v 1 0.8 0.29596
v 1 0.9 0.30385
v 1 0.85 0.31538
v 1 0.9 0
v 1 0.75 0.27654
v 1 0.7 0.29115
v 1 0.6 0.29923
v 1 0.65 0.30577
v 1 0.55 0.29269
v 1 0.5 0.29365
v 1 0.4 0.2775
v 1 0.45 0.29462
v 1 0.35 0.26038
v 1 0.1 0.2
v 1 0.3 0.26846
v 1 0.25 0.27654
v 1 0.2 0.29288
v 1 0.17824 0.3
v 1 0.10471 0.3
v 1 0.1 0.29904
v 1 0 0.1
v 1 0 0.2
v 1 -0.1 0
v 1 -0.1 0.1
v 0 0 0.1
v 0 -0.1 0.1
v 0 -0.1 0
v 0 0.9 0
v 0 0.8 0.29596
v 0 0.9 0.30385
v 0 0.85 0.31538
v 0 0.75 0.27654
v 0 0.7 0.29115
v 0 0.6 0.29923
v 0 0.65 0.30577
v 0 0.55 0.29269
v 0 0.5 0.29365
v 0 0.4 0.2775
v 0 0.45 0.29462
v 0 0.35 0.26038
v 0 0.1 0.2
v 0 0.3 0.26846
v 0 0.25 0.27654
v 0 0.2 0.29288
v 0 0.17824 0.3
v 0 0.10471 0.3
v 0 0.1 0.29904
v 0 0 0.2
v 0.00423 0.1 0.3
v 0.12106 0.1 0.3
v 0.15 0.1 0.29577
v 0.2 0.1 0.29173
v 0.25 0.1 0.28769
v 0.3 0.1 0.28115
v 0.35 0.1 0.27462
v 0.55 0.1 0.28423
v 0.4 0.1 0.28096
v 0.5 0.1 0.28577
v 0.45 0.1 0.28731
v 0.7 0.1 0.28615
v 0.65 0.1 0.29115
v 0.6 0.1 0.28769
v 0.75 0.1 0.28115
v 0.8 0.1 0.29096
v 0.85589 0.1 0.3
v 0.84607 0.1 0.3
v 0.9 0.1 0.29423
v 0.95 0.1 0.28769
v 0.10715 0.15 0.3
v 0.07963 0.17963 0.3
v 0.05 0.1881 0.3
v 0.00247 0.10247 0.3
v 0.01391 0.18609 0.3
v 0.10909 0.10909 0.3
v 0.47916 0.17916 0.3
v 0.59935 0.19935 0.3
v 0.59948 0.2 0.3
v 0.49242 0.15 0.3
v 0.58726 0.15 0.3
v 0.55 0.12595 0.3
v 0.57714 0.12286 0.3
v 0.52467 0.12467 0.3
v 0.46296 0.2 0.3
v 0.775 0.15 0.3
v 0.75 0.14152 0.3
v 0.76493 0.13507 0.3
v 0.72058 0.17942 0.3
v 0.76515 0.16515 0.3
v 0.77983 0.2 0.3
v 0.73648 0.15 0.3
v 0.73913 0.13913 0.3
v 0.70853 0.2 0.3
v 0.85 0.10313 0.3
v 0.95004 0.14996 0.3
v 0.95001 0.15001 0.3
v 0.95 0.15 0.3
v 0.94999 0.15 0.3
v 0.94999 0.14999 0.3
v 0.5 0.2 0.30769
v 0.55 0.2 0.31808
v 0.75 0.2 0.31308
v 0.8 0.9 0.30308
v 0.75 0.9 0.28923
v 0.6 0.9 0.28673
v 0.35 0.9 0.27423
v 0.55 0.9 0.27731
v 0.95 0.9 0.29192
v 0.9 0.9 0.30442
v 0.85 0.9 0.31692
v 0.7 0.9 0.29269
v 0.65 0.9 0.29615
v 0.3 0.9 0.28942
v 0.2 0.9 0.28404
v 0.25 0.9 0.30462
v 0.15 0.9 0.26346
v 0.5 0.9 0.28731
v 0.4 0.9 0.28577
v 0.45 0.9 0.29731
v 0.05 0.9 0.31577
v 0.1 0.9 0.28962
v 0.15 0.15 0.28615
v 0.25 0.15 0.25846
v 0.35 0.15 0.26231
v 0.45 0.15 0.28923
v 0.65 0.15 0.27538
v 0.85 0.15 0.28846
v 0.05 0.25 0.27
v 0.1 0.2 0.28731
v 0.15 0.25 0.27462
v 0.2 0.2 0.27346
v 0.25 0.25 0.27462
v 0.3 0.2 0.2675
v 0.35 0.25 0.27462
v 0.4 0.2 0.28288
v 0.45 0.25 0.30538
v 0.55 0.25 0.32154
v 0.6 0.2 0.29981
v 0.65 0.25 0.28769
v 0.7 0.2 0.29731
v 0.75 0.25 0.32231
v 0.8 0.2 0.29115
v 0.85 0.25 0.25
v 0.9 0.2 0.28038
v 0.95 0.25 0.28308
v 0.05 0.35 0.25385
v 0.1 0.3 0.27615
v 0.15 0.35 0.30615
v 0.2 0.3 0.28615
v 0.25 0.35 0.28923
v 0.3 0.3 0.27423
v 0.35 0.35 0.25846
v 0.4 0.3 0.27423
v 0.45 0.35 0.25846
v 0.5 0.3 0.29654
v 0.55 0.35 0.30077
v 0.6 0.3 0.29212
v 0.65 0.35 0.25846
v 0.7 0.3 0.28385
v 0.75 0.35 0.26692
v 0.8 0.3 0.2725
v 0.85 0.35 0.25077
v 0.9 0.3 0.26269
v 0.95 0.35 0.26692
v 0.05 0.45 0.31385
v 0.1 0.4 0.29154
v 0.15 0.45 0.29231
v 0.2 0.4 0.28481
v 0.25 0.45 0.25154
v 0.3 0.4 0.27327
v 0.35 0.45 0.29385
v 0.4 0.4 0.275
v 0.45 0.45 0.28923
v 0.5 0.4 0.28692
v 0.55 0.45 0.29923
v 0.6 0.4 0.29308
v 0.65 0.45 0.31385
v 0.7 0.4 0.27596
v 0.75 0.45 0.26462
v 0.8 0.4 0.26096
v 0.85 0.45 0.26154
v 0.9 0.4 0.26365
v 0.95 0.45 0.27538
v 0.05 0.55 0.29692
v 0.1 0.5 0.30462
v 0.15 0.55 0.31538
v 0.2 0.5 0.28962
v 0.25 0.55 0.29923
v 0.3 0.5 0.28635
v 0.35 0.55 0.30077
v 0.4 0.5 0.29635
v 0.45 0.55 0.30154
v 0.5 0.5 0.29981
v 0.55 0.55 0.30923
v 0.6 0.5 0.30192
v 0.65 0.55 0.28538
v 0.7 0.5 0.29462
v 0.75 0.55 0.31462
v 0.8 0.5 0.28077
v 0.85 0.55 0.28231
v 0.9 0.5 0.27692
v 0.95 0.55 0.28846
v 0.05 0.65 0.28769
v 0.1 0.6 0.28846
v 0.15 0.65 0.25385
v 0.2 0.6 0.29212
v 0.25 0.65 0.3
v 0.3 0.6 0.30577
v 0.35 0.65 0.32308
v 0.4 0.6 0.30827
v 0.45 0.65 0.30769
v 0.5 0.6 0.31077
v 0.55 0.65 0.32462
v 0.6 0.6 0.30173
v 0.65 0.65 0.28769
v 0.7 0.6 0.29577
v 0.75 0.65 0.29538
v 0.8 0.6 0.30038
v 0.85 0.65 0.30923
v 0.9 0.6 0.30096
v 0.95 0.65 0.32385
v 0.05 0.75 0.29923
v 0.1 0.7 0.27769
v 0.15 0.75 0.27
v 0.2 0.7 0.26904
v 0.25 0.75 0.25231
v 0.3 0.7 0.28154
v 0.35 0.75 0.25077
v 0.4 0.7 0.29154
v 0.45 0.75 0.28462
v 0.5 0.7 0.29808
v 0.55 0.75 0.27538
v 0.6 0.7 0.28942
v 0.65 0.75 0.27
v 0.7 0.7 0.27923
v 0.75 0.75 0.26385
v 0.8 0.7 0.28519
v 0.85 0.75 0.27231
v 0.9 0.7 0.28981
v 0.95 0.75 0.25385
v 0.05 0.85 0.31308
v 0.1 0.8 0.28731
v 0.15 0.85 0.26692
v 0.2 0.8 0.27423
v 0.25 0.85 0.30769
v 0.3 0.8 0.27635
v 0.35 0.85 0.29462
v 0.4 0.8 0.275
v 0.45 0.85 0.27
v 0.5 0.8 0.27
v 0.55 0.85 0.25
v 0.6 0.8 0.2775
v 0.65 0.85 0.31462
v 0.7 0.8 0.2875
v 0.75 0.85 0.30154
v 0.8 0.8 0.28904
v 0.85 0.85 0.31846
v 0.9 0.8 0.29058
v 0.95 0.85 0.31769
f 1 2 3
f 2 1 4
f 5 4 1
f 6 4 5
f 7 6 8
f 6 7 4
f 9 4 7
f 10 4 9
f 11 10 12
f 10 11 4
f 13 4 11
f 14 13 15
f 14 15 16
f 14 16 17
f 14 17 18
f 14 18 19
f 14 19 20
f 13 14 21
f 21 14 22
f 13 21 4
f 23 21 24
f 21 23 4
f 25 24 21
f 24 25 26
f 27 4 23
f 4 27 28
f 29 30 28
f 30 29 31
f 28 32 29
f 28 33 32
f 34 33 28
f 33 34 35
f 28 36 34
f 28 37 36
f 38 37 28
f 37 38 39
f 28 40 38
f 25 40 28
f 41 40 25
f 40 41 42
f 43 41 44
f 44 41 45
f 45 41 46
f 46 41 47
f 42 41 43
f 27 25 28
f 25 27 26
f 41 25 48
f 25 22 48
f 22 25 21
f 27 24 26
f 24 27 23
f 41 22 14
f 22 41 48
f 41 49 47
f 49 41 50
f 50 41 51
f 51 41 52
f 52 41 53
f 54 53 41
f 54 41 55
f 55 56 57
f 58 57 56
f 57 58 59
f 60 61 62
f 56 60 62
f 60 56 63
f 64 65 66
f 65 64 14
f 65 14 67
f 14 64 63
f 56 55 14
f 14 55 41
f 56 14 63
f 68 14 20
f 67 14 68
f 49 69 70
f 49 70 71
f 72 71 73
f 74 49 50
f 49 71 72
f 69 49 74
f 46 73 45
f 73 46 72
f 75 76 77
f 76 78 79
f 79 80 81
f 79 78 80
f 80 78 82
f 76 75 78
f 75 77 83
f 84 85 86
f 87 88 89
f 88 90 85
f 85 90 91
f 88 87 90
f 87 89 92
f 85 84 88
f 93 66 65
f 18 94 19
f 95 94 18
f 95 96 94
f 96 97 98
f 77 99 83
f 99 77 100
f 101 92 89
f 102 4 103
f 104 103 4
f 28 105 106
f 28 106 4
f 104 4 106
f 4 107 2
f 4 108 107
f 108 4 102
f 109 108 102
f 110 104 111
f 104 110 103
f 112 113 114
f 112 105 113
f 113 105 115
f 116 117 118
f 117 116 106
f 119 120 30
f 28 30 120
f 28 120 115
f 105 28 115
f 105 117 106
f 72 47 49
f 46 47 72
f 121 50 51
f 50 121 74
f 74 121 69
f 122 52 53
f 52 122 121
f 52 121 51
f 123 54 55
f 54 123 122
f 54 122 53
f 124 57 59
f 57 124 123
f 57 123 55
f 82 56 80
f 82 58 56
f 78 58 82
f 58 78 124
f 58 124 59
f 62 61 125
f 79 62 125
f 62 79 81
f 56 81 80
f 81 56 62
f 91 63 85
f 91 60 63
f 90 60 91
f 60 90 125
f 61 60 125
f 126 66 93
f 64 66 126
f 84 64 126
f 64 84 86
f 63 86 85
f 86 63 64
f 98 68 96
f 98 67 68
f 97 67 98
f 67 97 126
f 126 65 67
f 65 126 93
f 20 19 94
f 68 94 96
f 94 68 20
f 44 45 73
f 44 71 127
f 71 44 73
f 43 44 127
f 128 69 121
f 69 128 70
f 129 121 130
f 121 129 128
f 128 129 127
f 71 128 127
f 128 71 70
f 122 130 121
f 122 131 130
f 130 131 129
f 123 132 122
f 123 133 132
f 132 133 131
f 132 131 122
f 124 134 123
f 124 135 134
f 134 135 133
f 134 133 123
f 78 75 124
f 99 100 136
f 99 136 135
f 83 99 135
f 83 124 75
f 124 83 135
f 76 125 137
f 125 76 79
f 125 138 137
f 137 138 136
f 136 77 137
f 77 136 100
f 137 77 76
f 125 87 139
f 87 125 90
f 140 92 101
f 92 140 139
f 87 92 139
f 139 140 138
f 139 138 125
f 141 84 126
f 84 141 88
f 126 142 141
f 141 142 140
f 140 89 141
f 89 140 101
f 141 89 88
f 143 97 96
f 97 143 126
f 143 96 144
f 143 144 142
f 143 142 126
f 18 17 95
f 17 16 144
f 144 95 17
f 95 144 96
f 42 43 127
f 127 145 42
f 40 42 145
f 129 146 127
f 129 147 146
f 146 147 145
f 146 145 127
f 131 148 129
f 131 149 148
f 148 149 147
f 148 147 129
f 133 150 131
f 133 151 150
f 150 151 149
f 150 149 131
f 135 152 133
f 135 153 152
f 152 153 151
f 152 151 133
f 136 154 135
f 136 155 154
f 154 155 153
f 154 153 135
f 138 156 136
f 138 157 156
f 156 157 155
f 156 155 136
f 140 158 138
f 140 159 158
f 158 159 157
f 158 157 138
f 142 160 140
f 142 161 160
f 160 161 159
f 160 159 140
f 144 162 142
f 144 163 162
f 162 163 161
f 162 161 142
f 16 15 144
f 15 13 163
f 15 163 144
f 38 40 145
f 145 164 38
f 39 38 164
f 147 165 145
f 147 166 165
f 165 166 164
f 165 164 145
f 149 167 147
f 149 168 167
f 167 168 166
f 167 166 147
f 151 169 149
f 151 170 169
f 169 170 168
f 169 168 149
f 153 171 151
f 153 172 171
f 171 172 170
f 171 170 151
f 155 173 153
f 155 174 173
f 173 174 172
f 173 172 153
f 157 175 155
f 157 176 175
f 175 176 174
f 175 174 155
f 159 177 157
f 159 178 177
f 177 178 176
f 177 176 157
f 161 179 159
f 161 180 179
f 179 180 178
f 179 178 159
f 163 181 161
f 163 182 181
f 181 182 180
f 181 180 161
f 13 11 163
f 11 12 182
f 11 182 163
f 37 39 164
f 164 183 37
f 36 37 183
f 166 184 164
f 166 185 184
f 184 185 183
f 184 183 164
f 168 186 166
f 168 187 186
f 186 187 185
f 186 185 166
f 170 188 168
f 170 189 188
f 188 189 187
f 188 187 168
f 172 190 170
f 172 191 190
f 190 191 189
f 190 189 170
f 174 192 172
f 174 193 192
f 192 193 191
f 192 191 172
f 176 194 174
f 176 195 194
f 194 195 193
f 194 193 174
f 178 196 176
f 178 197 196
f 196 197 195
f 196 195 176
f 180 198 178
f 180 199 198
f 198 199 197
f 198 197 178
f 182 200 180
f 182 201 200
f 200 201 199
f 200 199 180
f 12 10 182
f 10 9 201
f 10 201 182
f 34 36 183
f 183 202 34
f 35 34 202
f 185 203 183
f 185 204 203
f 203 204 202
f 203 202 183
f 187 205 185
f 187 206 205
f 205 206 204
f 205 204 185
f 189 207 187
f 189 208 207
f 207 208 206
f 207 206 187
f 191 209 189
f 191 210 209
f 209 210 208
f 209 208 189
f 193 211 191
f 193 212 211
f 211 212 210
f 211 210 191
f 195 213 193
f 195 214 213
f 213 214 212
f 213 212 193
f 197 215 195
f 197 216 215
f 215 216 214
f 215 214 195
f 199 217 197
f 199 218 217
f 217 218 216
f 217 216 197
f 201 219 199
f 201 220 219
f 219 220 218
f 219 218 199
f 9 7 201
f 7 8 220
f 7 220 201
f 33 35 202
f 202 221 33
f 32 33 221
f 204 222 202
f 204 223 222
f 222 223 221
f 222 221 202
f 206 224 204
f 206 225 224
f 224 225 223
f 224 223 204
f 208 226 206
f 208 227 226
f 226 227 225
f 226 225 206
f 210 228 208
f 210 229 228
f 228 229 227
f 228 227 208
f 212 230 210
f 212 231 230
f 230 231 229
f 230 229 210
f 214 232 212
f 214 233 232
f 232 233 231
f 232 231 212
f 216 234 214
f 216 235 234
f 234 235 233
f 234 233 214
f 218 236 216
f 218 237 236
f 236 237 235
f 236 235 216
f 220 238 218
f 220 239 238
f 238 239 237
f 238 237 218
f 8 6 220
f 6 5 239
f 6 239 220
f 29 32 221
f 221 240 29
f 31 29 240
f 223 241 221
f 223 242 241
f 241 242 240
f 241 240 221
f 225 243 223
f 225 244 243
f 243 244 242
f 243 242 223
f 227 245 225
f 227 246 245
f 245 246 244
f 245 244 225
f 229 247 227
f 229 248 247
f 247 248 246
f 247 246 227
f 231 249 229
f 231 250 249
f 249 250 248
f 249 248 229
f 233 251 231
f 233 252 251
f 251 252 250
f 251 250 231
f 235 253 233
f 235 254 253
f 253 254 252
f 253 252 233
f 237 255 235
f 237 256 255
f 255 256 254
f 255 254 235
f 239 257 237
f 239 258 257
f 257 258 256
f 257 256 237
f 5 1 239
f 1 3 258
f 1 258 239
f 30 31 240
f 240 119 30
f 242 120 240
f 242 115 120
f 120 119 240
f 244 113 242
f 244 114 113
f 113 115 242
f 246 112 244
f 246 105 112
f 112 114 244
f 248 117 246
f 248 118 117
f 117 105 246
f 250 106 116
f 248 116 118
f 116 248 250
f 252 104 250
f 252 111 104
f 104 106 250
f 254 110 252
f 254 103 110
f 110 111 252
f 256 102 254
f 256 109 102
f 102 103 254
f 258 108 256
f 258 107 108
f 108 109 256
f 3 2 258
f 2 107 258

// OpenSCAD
intersection() {
    color([0.3, 0.3, 0.5])
    for (i = [0.1:0.1:1]) {
        translate([0,i-.2,0])
        cube([1,.1, i]);
    }
    
    color([0.5, 0.5, 0.5])
    translate([-.15,-.15,.25])
    scale([1/10,1/10, 1/13])
    union() {
        surface("jagged.dat");
        translate([0,0,-13])
        cube([13,13,13]);
    }
}
